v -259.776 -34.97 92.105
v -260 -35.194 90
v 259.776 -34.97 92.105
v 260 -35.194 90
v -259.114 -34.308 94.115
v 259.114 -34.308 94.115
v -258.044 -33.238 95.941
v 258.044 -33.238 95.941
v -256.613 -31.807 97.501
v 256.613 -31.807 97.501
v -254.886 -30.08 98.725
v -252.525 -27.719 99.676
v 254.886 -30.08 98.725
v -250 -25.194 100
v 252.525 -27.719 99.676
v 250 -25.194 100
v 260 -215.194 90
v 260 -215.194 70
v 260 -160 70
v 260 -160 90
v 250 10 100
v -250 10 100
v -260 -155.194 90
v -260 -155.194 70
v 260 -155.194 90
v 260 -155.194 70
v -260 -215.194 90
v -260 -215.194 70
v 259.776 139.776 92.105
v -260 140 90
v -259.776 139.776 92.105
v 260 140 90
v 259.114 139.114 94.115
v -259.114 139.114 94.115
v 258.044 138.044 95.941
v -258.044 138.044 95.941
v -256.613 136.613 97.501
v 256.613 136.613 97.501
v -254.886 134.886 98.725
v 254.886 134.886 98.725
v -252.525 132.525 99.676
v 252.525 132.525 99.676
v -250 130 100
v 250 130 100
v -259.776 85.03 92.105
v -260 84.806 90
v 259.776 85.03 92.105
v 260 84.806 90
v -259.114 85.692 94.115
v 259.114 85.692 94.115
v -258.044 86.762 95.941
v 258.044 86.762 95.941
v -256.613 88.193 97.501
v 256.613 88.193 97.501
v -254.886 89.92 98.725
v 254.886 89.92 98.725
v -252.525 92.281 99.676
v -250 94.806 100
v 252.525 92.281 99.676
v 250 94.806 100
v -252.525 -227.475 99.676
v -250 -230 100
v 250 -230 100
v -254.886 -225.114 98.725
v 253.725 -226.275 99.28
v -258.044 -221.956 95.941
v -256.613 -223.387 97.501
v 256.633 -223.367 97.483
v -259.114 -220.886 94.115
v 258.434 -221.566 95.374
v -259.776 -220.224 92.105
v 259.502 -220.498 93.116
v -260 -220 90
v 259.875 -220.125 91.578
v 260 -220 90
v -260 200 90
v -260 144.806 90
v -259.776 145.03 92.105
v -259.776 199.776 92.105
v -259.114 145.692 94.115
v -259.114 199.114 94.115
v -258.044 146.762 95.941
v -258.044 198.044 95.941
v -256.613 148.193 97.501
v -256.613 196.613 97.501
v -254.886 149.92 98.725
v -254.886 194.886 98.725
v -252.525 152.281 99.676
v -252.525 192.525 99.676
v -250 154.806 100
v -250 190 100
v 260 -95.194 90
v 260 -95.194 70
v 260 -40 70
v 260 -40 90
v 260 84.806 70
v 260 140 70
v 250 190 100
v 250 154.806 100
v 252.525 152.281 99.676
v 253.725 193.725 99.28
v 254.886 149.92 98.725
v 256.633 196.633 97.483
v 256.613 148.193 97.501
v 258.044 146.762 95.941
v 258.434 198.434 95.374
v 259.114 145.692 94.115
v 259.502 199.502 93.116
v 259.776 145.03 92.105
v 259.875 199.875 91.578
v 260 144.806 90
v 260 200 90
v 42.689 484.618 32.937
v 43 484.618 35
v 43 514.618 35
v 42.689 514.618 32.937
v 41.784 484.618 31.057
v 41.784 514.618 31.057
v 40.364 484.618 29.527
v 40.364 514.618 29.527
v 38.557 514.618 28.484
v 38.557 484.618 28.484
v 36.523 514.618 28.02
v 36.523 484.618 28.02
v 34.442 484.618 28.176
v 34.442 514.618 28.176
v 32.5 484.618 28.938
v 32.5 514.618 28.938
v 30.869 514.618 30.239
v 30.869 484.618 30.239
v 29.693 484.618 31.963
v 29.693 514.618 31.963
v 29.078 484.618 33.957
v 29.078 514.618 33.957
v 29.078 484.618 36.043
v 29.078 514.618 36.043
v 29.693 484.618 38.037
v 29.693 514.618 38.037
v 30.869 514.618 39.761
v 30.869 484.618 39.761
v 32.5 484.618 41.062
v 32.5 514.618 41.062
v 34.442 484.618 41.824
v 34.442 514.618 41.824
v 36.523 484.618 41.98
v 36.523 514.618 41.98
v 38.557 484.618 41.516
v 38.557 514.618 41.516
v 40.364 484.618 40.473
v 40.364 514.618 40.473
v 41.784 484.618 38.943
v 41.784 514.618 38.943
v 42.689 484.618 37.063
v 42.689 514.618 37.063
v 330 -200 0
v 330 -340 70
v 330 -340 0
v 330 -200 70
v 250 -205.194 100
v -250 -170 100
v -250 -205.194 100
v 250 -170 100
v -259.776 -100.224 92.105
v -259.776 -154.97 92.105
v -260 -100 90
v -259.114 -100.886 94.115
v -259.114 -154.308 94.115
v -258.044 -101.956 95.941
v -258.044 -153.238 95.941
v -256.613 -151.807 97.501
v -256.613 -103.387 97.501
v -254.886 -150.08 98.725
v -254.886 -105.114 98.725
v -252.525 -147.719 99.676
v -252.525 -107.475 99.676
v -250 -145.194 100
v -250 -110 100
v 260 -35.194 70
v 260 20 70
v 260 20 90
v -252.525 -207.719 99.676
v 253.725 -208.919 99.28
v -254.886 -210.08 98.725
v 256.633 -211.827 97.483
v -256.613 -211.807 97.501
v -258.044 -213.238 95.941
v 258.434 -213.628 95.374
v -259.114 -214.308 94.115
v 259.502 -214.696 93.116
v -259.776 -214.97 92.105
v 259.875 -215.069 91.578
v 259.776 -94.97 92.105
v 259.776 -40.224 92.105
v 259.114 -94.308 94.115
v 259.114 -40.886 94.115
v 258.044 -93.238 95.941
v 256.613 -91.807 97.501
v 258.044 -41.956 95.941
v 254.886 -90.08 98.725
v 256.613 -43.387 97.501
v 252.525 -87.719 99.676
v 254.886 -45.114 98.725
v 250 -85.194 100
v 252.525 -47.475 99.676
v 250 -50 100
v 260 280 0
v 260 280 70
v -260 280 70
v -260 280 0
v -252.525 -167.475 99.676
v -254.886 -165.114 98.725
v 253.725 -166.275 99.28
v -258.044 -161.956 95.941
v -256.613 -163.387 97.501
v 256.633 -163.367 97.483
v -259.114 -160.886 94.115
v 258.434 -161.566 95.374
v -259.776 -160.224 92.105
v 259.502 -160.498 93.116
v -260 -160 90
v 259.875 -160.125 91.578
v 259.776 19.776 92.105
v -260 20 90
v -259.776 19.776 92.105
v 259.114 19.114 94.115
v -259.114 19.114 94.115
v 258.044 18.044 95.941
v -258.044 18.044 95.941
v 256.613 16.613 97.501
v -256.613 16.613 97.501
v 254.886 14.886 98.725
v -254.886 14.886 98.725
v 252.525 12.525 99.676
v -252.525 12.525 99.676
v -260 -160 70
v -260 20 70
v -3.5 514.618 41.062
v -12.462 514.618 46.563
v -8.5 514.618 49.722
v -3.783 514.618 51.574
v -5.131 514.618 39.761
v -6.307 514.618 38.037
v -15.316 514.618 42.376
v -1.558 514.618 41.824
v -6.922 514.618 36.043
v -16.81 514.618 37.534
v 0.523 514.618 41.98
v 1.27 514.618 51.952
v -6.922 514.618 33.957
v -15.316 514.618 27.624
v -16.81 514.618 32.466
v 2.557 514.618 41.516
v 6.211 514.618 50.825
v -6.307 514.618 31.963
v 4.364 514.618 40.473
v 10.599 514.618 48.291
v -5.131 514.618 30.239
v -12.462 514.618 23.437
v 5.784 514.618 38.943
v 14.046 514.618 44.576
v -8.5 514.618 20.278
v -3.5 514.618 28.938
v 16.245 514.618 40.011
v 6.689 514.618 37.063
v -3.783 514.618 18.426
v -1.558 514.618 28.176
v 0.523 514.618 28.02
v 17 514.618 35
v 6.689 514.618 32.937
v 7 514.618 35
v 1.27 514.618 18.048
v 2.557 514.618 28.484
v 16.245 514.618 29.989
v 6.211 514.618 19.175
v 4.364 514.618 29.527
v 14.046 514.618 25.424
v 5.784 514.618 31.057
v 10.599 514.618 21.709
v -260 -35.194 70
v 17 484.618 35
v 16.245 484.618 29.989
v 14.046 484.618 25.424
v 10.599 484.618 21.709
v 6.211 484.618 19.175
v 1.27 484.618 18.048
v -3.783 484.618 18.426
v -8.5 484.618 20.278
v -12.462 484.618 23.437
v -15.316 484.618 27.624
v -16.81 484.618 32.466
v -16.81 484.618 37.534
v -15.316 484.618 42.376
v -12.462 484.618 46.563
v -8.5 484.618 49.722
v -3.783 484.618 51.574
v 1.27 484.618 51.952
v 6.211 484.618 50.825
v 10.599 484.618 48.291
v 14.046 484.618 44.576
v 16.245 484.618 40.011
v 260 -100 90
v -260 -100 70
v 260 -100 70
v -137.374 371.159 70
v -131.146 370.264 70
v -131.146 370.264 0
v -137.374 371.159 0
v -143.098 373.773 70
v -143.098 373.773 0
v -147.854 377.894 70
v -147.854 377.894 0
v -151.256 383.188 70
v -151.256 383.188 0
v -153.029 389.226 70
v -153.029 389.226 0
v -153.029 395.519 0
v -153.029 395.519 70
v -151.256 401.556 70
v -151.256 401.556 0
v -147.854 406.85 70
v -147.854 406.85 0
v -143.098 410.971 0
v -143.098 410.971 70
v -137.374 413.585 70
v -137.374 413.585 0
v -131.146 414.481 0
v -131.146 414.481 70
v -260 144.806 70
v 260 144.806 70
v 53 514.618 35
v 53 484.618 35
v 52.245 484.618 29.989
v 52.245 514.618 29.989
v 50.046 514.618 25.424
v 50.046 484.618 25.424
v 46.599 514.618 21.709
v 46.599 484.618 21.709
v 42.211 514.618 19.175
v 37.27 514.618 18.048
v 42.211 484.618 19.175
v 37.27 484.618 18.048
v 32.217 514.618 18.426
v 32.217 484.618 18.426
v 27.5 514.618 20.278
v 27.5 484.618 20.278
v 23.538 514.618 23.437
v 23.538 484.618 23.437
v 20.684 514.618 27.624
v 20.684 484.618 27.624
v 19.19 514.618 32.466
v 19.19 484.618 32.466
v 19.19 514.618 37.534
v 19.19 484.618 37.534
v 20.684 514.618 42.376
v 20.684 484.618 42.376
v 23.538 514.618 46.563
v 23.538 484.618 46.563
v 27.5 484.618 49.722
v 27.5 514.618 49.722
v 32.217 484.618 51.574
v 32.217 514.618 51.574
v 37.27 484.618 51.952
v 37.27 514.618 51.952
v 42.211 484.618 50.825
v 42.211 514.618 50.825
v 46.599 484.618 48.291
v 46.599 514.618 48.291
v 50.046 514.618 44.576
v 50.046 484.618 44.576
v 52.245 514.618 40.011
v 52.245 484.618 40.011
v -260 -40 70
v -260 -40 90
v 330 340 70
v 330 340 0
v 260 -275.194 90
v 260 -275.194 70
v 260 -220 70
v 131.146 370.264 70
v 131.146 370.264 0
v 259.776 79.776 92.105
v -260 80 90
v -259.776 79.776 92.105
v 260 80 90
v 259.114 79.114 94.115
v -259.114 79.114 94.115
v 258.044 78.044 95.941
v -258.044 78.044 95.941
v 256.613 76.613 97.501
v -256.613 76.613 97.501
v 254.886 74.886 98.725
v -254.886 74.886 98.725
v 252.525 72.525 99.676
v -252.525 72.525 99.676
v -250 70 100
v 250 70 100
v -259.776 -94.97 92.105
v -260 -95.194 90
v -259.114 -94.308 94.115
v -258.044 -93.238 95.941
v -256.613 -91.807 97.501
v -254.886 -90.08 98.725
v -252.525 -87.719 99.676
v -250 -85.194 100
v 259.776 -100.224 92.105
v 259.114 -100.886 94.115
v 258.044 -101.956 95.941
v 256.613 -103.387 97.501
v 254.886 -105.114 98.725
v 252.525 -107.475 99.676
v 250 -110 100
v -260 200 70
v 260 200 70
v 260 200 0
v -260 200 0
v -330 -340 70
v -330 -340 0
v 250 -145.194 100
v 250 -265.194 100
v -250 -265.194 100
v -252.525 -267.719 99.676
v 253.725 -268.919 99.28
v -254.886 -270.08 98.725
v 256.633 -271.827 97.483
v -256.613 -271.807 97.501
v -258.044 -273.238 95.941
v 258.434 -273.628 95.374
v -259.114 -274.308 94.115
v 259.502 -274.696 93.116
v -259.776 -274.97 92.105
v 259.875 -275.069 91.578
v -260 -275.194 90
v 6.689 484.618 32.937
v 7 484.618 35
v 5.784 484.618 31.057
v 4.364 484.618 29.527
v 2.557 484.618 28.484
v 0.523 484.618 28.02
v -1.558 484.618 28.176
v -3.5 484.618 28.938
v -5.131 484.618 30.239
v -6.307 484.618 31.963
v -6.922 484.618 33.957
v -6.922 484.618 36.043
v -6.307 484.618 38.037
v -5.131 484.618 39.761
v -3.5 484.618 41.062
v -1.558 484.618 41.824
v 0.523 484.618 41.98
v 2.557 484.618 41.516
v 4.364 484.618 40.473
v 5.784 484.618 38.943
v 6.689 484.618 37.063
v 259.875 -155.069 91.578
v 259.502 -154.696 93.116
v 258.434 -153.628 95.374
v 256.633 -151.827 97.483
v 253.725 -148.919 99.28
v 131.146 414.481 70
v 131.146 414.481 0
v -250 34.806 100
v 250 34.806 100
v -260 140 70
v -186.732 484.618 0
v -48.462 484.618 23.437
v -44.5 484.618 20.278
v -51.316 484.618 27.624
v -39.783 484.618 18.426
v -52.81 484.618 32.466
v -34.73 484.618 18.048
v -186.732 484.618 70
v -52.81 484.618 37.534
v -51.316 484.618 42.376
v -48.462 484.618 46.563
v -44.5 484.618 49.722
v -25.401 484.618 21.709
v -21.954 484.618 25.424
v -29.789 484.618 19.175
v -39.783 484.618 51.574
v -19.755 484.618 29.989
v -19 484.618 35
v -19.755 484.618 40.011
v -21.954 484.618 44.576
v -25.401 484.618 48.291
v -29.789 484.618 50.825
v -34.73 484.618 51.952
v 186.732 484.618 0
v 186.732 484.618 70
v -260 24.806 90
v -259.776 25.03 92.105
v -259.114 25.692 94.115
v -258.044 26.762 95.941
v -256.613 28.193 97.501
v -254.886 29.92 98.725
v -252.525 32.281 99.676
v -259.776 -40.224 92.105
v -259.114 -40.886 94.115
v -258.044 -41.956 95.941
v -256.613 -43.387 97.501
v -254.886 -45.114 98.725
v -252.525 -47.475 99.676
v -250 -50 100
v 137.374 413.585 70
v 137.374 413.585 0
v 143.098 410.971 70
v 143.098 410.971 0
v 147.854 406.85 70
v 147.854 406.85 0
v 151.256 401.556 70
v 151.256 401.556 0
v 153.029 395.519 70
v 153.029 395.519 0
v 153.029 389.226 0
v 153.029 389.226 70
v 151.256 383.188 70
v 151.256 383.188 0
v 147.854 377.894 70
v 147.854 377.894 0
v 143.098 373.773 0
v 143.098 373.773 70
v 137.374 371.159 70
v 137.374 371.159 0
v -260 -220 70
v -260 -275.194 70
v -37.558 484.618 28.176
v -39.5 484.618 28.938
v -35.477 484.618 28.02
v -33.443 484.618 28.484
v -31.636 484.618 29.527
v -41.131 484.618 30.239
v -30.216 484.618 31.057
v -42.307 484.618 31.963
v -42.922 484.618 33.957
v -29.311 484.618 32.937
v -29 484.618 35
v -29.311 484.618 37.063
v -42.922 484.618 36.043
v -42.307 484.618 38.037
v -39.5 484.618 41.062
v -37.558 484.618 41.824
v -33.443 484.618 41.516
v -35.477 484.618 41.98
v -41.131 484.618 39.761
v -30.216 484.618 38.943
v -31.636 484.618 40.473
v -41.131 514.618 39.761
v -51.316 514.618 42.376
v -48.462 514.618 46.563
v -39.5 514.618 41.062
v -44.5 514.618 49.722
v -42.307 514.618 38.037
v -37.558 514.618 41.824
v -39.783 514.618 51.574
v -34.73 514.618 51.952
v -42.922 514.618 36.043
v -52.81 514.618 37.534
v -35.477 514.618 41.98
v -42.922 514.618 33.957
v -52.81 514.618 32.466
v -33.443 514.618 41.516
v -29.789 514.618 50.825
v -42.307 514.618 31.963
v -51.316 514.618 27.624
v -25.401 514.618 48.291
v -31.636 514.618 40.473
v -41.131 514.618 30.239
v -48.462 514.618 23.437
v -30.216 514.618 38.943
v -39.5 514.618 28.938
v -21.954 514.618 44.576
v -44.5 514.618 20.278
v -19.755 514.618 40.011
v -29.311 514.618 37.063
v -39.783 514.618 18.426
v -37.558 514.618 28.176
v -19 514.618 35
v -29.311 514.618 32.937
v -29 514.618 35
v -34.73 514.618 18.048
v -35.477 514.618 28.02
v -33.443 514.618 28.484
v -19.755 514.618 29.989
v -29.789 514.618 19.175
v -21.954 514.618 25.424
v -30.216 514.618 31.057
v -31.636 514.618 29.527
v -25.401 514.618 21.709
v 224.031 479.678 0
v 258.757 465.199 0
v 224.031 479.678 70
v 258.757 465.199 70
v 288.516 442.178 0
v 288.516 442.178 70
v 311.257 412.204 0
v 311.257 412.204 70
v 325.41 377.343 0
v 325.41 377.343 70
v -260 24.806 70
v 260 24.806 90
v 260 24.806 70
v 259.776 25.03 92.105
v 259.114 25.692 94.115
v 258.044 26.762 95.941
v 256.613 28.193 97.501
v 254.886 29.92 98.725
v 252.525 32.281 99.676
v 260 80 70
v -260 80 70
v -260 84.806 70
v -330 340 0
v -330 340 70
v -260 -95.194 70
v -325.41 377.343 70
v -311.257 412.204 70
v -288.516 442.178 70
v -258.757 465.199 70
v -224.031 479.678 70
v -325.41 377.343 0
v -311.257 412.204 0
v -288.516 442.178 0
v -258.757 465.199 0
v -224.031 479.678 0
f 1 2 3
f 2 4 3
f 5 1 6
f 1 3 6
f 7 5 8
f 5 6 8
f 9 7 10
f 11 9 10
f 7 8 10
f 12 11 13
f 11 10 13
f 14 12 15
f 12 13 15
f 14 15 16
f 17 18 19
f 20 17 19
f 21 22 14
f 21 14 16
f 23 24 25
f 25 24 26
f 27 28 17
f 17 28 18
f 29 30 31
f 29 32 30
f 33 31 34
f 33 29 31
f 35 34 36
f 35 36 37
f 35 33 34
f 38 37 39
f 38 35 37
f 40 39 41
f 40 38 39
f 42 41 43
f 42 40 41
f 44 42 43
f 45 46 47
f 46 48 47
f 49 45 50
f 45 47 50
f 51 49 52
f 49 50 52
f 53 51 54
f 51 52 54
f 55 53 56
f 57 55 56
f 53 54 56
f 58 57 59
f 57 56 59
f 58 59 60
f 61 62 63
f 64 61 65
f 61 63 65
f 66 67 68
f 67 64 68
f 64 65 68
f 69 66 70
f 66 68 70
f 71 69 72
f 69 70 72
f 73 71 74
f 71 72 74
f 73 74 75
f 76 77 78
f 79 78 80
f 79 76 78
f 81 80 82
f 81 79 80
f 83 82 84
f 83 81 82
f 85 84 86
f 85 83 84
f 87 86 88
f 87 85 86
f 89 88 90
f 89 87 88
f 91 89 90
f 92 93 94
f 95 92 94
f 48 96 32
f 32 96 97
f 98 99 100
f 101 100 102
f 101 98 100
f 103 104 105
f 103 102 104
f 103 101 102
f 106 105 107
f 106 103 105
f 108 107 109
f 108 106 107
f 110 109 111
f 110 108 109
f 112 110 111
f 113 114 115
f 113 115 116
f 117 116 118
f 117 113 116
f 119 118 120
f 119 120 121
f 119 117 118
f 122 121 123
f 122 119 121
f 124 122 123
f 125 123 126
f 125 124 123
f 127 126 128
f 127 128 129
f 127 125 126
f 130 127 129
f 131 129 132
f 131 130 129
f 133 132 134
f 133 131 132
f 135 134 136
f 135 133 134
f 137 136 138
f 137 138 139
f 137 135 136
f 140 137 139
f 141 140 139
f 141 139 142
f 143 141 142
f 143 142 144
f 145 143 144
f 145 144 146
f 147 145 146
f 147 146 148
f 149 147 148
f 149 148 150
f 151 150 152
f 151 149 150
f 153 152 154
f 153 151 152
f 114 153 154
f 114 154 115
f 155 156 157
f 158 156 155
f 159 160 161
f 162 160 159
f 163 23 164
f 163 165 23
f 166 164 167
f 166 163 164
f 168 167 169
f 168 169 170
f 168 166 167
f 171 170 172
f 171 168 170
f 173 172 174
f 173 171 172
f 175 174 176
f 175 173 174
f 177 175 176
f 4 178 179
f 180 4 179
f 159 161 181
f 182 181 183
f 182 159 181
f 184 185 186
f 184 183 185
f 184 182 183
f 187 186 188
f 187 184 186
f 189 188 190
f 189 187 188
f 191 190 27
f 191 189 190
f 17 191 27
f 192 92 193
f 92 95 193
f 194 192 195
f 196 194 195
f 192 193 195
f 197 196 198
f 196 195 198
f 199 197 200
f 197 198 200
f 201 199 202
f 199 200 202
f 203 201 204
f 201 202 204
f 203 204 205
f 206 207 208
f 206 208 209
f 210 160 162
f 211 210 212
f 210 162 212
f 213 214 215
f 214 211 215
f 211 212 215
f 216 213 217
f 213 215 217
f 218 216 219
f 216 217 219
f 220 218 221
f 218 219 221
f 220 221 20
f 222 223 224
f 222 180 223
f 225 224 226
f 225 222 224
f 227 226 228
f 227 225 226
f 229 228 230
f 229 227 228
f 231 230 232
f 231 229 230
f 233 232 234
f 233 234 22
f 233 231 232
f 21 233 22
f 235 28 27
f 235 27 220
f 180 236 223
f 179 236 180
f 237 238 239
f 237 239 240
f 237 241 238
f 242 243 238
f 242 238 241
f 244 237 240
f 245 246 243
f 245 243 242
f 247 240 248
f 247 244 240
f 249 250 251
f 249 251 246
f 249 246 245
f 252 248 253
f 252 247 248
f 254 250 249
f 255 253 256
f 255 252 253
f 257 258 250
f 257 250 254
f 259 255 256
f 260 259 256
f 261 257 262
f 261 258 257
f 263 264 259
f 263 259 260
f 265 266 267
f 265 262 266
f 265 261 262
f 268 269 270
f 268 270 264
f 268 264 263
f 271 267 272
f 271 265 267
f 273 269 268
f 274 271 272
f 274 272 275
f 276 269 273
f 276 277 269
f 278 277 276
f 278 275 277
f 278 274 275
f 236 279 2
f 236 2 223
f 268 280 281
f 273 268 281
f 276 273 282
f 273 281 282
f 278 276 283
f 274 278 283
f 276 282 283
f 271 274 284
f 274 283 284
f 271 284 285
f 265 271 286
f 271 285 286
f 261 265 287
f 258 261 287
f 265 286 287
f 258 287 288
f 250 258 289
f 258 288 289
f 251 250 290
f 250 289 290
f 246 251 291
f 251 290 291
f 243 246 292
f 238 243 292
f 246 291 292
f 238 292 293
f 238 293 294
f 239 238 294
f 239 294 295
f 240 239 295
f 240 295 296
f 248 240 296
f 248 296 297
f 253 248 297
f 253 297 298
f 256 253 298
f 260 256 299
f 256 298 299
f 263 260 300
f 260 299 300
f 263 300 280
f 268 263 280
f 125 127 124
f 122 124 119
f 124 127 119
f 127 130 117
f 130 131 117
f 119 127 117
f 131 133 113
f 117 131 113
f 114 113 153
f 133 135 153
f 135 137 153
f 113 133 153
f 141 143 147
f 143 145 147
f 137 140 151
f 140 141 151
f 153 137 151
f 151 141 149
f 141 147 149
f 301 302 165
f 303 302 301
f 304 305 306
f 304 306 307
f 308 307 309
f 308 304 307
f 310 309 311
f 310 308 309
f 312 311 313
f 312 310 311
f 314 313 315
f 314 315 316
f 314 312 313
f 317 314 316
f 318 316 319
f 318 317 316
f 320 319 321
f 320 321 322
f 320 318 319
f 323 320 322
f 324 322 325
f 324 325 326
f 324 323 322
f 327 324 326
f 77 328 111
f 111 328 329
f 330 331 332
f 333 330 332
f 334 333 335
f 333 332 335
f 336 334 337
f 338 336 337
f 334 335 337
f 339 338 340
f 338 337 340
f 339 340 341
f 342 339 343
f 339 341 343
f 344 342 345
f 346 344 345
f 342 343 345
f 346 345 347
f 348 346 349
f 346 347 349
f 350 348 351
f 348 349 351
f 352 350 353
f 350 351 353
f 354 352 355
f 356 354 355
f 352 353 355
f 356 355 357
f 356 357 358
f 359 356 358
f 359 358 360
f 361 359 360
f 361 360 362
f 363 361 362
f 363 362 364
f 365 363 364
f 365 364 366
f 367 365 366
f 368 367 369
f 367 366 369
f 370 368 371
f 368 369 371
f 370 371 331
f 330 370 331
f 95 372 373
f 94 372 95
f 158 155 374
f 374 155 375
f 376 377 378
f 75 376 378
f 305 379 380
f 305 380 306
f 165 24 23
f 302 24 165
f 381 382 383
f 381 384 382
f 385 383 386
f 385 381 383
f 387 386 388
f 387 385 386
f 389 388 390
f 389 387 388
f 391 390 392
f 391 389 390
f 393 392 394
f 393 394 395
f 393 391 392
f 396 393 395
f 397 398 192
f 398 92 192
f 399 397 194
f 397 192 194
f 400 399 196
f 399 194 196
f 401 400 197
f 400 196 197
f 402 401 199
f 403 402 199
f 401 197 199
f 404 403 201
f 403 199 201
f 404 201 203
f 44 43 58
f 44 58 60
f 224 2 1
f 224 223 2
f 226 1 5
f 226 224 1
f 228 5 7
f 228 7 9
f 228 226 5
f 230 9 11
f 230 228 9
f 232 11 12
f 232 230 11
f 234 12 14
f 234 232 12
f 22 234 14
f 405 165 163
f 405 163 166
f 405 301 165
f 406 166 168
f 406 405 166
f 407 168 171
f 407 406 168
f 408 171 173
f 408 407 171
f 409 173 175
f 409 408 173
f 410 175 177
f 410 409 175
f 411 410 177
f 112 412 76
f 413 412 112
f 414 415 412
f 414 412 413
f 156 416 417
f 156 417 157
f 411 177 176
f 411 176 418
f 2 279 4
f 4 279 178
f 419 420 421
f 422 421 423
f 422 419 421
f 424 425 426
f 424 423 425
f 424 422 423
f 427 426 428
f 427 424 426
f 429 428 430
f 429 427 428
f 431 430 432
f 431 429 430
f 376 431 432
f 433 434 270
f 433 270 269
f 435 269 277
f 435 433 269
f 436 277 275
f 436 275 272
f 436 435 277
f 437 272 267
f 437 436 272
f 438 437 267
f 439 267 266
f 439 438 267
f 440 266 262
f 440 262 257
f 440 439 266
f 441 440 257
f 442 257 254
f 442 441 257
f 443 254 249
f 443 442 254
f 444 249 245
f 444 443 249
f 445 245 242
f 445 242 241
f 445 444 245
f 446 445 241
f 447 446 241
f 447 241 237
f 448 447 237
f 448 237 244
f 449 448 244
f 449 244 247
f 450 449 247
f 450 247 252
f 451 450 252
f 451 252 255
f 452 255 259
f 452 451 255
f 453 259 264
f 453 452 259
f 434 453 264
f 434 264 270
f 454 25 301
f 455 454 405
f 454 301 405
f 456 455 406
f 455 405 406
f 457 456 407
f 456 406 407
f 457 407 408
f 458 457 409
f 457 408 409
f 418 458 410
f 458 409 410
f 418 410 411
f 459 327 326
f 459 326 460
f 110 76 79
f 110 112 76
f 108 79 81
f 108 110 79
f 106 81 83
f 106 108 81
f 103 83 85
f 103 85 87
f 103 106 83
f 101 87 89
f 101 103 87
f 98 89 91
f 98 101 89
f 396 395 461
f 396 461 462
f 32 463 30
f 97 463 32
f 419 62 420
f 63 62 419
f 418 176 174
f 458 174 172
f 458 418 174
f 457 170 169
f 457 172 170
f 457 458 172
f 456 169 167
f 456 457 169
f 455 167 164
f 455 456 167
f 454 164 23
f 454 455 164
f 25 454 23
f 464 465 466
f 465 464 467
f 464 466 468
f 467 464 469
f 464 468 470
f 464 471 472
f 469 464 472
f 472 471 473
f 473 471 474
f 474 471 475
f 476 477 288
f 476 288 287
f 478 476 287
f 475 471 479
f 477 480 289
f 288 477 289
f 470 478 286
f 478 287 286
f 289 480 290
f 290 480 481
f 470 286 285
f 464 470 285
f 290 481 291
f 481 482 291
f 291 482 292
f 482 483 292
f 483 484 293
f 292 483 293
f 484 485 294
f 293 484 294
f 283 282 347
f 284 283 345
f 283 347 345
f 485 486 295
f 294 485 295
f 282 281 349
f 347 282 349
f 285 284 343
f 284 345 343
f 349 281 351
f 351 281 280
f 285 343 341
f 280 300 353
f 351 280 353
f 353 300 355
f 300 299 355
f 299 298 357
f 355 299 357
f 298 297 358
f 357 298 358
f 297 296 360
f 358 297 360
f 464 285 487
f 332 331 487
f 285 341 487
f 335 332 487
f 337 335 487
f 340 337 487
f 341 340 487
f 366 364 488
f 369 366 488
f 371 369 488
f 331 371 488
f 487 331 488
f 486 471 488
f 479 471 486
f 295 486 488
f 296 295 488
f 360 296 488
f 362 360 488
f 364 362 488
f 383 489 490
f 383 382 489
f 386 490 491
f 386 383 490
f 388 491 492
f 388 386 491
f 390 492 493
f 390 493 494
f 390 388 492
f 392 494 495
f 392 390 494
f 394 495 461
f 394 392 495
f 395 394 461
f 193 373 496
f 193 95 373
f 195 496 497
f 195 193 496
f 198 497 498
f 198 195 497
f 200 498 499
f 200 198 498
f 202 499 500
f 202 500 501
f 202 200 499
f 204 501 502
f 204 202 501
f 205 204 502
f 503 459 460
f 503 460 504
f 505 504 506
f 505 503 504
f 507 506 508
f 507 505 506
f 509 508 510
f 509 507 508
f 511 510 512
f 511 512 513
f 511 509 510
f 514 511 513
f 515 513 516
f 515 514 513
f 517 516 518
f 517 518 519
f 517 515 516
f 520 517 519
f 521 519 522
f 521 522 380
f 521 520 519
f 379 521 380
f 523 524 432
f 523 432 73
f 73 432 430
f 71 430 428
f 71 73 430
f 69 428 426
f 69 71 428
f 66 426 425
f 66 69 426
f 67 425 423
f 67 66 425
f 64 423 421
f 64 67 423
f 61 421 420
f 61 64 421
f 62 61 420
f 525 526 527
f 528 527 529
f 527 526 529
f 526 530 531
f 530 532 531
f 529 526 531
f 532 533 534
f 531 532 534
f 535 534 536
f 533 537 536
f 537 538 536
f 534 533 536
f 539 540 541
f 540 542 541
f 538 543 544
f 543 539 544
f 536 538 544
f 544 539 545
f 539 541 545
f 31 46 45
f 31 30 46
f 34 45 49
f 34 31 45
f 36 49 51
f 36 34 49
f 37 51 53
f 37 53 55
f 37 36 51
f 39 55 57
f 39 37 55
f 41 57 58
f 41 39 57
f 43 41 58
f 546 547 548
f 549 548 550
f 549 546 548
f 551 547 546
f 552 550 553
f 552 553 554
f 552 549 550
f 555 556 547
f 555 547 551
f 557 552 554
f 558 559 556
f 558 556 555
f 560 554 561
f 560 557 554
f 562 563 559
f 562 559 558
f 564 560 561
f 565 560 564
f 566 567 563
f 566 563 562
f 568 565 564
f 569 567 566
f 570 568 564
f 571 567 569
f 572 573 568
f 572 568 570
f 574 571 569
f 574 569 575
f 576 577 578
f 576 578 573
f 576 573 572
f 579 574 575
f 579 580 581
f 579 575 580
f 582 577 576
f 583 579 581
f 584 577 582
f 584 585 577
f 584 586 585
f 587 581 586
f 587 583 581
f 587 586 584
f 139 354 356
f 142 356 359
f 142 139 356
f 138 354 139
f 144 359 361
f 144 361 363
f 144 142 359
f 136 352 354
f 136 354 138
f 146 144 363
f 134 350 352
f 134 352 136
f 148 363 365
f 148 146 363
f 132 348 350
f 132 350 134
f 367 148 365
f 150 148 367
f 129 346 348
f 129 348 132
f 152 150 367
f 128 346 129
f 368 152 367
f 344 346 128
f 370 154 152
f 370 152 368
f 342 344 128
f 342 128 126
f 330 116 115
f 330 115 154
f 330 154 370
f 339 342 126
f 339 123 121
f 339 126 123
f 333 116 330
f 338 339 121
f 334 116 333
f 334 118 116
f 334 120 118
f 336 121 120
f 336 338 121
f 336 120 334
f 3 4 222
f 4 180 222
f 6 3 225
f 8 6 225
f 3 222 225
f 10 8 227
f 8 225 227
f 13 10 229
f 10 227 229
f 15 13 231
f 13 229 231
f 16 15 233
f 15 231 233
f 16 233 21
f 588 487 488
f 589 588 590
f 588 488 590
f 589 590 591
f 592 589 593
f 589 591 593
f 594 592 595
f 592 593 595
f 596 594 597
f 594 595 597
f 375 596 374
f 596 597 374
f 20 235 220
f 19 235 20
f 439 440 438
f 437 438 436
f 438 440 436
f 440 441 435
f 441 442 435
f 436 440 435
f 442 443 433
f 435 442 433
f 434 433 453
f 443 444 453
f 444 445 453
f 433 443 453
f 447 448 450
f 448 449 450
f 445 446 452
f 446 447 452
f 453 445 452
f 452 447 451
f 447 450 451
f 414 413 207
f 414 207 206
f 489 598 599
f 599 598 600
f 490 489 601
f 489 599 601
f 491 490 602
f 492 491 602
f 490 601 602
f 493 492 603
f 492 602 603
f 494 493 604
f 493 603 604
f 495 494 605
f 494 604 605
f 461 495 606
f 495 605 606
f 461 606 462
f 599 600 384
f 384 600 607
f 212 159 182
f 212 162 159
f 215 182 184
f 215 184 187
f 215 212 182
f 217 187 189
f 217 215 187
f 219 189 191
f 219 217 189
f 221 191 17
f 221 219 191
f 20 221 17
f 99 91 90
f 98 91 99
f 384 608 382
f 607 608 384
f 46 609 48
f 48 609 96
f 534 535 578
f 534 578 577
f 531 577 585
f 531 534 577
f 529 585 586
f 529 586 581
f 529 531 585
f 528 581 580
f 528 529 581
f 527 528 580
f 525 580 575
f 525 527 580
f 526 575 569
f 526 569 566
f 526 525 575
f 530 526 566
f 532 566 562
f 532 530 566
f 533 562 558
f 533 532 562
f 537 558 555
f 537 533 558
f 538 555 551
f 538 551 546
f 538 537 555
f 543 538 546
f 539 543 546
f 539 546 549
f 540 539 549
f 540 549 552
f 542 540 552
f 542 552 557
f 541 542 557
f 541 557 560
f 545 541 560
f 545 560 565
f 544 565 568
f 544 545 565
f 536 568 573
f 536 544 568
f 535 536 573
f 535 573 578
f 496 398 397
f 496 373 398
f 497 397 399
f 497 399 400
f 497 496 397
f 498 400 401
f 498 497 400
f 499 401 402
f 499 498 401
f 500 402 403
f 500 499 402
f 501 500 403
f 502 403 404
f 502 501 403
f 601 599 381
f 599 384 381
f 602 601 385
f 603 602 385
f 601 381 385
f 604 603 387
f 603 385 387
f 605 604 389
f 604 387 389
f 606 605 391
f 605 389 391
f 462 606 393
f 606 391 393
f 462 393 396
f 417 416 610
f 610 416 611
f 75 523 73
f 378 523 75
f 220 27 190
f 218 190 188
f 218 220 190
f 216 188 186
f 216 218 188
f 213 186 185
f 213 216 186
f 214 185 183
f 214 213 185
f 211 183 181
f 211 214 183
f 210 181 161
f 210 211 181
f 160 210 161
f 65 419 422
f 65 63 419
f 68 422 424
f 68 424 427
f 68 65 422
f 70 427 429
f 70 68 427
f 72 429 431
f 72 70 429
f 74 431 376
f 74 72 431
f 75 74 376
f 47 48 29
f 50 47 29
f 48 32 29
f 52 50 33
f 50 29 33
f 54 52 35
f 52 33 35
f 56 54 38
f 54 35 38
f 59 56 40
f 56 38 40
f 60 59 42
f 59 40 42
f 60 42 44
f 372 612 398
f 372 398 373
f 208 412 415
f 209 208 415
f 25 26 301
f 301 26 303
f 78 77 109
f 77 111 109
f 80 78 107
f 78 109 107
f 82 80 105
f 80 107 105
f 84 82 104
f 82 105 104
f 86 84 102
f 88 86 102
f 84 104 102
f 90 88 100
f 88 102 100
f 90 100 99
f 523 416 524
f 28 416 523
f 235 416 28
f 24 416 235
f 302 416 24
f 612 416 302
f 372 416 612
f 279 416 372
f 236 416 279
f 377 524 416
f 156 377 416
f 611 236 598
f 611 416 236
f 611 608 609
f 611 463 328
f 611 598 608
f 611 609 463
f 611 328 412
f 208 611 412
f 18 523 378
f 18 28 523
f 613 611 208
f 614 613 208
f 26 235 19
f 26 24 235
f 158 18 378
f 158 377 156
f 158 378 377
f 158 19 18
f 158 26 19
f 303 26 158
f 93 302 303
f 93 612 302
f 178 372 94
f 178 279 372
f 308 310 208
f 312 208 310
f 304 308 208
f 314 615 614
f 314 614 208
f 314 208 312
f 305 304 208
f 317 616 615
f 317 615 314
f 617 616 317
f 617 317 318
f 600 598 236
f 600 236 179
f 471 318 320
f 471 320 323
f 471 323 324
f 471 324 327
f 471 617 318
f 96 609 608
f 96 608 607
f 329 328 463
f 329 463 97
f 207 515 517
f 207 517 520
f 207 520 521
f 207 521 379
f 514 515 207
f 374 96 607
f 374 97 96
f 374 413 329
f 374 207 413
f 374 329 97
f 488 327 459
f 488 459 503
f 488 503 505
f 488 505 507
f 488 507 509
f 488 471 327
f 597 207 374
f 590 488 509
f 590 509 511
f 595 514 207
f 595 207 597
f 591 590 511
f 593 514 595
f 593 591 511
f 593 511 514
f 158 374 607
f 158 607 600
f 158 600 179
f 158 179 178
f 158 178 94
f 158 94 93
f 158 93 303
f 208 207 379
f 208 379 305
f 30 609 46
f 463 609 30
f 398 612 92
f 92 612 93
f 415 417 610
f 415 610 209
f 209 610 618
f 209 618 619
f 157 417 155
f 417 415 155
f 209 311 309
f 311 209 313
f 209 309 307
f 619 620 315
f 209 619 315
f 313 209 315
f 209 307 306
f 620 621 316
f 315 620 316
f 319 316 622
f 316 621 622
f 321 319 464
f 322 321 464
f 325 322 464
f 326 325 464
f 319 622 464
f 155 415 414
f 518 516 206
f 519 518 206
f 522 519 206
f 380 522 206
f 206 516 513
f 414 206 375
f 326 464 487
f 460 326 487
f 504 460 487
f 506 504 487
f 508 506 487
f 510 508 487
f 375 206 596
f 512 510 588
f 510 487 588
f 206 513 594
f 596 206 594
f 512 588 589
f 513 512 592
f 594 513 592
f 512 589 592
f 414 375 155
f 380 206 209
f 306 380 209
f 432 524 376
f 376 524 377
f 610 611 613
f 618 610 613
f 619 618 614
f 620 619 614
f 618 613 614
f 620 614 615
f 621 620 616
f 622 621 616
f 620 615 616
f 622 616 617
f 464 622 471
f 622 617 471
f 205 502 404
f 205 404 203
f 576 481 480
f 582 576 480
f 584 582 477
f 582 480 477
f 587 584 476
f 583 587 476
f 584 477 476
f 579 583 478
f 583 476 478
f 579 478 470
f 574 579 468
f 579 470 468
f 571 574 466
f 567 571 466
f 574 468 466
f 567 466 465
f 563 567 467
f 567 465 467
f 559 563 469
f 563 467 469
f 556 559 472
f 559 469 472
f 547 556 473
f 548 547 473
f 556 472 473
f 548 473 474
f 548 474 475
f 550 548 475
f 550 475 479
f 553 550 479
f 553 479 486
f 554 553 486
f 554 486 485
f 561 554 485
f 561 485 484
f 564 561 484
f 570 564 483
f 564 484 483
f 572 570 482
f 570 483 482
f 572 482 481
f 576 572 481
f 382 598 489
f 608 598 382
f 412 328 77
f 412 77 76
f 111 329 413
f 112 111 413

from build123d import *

# Parameters (mm, degrees)
SKETCH1_W           = 660
SKETCH1_H           = 400
BOSS_EXTRUDE1_DEPTH = 70
SKETCH2_W           = 70
SKETCH2_H           = 70
BOSS_EXTRUDE2_DEPTH = 140
SKETCH3_W           = 70
SKETCH3_H           = 60
BOSS_EXTRUDE3_DEPTH = 660
BOSS_EXTRUDE4_DEPTH = 70
SKETCH5_W           = 520
SKETCH5_H           = 55.194253578
BOSS_EXTRUDE5_DEPTH = 30
FILLET1_R           = 10
SKETCH6_R           = 17
SKETCH6_R_2         = 7
BOSS_EXTRUDE6_DEPTH = 30
SKETCH9_W           = 660.000414718
SKETCH9_H           = 140
BOSS_EXTRUDE7_DEPTH = 70
SKETCH10_W          = 520
SKETCH10_H          = 55.194253578
BOSS_EXTRUDE8_DEPTH = 30
FILLET2_R           = 10


with BuildPart() as part:
    # Sketch1 → Boss-Extrude1 (new body)
    with BuildSketch(Plane.XY):
        Rectangle(SKETCH1_W, SKETCH1_H)
    extrude(amount=BOSS_EXTRUDE1_DEPTH)

    # Sketch2 → Boss-Extrude2 (add)
    with BuildSketch(Plane(origin=(0, 200, 0), x_dir=(1, 0, 0), z_dir=(0, 1, 0))):
        with Locations((-295, -35)):
            Rectangle(SKETCH2_W, SKETCH2_H)
        with Locations((295, -35)):
            Rectangle(SKETCH2_W, SKETCH2_H)
    extrude(amount=BOSS_EXTRUDE2_DEPTH)

    # Sketch3 → Boss-Extrude3 (add)
    with BuildSketch(Plane(origin=(330, 0, 0), x_dir=(0, 0, -1), z_dir=(1, 0, 0))):
        with Locations((-35, 310)):
            Rectangle(SKETCH3_W, SKETCH3_H)
    extrude(amount=-BOSS_EXTRUDE3_DEPTH)

    # Sketch4 → Boss-Extrude4 (add)
    with BuildSketch(Plane.XY.offset(70)):
        with BuildLine():
            Line((-186.732097713, 484.618446846), (186.732097713, 484.618446846))
            ThreePointArc((186.732097713, 484.618446846), (288.516412558, 442.178022701), (330, 340))
            Line((330, 340), (-330, 340))
            ThreePointArc((-330, 340), (-288.516412558, 442.178022701), (-186.732097713, 484.618446846))
        make_face()
        with BuildLine():
            Line((-131.145584022, 414.4805226), (131.145584022, 414.4805226))
            ThreePointArc((131.145584022, 414.4805226), (153.253905114, 392.372201507), (131.145584022, 370.263880415))
            Line((131.145584022, 370.263880415), (-131.145584022, 370.263880415))
            ThreePointArc((-131.145584022, 370.263880415), (-153.253905114, 392.372201507), (-131.145584022, 414.4805226))
        make_face(mode=Mode.SUBTRACT)
    extrude(amount=-BOSS_EXTRUDE4_DEPTH)

    # Sketch5 → Boss-Extrude5 (add)
    with BuildSketch(Plane.XY.offset(70)):
        with Locations((0, 172.402873211)):
            Rectangle(SKETCH5_W, SKETCH5_H)
        with Locations((0, 112.402873211)):
            Rectangle(SKETCH5_W, SKETCH5_H)
        with Locations((0, 52.402873211)):
            Rectangle(SKETCH5_W, SKETCH5_H)
        with Locations((0, -7.597126789)):
            Rectangle(SKETCH5_W, SKETCH5_H)
        with Locations((0, -67.597126789)):
            Rectangle(SKETCH5_W, SKETCH5_H)
        with Locations((0, -127.597126789)):
            Rectangle(SKETCH5_W, SKETCH5_H)
    extrude(amount=BOSS_EXTRUDE5_DEPTH)

    # Fillet1
    fillet1_edges = [part.edges().sort_by_distance(p)[0] for p in [
        (0, 140, 100),
        (-260, 112.402873211, 100),
        (0, 84.805746422, 100),
        (260, 112.402873211, 100),
        (0, 80, 100),
        (-260, 52.402873211, 100),
        (0, 24.805746422, 100),
        (260, 52.402873211, 100),
        (0, 20, 100),
        (-260, -7.597126789, 100),
        (0, -35.194253578, 100),
        (260, -7.597126789, 100),
        (0, -40, 100),
        (-260, -67.597126789, 100),
        (0, -95.194253578, 100),
        (260, -67.597126789, 100),
        (0, -100, 100),
        (-260, -127.597126789, 100),
        (0, -155.194253578, 100),
        (260, -127.597126789, 100),
        (-260, 172.402873211, 100),
        (0, 144.805746422, 100),
        (260, 172.402873211, 100),
        (0, 200, 100),
    ]]
    fillet(fillet1_edges, radius=FILLET1_R)

    # Sketch6 → Boss-Extrude6 (add)
    with BuildSketch(Plane(origin=(0, 484.618446846, 0), x_dir=(1, 0, 0), z_dir=(0, 1, 0))):
        with Locations((-36, -35)):
            Circle(SKETCH6_R)
        with Locations((-36, -35)):
            Circle(SKETCH6_R_2, mode=Mode.SUBTRACT)
        with Locations((0, -35)):
            Circle(SKETCH6_R)
        with Locations((0, -35)):
            Circle(SKETCH6_R_2, mode=Mode.SUBTRACT)
        with Locations((36, -35)):
            Circle(SKETCH6_R)
        with Locations((36, -35)):
            Circle(SKETCH6_R_2, mode=Mode.SUBTRACT)
    extrude(amount=BOSS_EXTRUDE6_DEPTH)

    # Sketch9 → Boss-Extrude7 (add)
    with BuildSketch(Plane.XY.offset(70)):
        with Locations((0.000207359, -270)):
            Rectangle(SKETCH9_W, SKETCH9_H)
    extrude(amount=-BOSS_EXTRUDE7_DEPTH)

    # Sketch10 → Boss-Extrude8 (add)
    with BuildSketch(Plane.XY.offset(70)):
        with Locations((0, -187.597126789)):
            Rectangle(SKETCH10_W, SKETCH10_H)
        with Locations((0, -127.597126789)):
            Rectangle(SKETCH10_W, SKETCH10_H)
        with Locations((0, -247.597126789)):
            Rectangle(SKETCH10_W, SKETCH10_H)
    extrude(amount=BOSS_EXTRUDE8_DEPTH)

    # Fillet2
    fillet2_edges = [part.edges().sort_by_distance(p)[0] for p in [
        (-260, -127.597126789, 100),
        (0, -155.194253578, 100),
        (260, -127.597126789, 100),
        (0, -100, 100),
        (-260, -187.597126789, 100),
        (0, -215.194253578, 100),
        (260, -187.597126789, 100),
        (0, -160, 100),
        (-260, -247.597126789, 100),
        (0, -275.194253578, 100),
        (260, -247.597126789, 100),
        (0, -220, 100),
    ]]
    fillet(fillet2_edges, radius=FILLET2_R)


solid = part.part
